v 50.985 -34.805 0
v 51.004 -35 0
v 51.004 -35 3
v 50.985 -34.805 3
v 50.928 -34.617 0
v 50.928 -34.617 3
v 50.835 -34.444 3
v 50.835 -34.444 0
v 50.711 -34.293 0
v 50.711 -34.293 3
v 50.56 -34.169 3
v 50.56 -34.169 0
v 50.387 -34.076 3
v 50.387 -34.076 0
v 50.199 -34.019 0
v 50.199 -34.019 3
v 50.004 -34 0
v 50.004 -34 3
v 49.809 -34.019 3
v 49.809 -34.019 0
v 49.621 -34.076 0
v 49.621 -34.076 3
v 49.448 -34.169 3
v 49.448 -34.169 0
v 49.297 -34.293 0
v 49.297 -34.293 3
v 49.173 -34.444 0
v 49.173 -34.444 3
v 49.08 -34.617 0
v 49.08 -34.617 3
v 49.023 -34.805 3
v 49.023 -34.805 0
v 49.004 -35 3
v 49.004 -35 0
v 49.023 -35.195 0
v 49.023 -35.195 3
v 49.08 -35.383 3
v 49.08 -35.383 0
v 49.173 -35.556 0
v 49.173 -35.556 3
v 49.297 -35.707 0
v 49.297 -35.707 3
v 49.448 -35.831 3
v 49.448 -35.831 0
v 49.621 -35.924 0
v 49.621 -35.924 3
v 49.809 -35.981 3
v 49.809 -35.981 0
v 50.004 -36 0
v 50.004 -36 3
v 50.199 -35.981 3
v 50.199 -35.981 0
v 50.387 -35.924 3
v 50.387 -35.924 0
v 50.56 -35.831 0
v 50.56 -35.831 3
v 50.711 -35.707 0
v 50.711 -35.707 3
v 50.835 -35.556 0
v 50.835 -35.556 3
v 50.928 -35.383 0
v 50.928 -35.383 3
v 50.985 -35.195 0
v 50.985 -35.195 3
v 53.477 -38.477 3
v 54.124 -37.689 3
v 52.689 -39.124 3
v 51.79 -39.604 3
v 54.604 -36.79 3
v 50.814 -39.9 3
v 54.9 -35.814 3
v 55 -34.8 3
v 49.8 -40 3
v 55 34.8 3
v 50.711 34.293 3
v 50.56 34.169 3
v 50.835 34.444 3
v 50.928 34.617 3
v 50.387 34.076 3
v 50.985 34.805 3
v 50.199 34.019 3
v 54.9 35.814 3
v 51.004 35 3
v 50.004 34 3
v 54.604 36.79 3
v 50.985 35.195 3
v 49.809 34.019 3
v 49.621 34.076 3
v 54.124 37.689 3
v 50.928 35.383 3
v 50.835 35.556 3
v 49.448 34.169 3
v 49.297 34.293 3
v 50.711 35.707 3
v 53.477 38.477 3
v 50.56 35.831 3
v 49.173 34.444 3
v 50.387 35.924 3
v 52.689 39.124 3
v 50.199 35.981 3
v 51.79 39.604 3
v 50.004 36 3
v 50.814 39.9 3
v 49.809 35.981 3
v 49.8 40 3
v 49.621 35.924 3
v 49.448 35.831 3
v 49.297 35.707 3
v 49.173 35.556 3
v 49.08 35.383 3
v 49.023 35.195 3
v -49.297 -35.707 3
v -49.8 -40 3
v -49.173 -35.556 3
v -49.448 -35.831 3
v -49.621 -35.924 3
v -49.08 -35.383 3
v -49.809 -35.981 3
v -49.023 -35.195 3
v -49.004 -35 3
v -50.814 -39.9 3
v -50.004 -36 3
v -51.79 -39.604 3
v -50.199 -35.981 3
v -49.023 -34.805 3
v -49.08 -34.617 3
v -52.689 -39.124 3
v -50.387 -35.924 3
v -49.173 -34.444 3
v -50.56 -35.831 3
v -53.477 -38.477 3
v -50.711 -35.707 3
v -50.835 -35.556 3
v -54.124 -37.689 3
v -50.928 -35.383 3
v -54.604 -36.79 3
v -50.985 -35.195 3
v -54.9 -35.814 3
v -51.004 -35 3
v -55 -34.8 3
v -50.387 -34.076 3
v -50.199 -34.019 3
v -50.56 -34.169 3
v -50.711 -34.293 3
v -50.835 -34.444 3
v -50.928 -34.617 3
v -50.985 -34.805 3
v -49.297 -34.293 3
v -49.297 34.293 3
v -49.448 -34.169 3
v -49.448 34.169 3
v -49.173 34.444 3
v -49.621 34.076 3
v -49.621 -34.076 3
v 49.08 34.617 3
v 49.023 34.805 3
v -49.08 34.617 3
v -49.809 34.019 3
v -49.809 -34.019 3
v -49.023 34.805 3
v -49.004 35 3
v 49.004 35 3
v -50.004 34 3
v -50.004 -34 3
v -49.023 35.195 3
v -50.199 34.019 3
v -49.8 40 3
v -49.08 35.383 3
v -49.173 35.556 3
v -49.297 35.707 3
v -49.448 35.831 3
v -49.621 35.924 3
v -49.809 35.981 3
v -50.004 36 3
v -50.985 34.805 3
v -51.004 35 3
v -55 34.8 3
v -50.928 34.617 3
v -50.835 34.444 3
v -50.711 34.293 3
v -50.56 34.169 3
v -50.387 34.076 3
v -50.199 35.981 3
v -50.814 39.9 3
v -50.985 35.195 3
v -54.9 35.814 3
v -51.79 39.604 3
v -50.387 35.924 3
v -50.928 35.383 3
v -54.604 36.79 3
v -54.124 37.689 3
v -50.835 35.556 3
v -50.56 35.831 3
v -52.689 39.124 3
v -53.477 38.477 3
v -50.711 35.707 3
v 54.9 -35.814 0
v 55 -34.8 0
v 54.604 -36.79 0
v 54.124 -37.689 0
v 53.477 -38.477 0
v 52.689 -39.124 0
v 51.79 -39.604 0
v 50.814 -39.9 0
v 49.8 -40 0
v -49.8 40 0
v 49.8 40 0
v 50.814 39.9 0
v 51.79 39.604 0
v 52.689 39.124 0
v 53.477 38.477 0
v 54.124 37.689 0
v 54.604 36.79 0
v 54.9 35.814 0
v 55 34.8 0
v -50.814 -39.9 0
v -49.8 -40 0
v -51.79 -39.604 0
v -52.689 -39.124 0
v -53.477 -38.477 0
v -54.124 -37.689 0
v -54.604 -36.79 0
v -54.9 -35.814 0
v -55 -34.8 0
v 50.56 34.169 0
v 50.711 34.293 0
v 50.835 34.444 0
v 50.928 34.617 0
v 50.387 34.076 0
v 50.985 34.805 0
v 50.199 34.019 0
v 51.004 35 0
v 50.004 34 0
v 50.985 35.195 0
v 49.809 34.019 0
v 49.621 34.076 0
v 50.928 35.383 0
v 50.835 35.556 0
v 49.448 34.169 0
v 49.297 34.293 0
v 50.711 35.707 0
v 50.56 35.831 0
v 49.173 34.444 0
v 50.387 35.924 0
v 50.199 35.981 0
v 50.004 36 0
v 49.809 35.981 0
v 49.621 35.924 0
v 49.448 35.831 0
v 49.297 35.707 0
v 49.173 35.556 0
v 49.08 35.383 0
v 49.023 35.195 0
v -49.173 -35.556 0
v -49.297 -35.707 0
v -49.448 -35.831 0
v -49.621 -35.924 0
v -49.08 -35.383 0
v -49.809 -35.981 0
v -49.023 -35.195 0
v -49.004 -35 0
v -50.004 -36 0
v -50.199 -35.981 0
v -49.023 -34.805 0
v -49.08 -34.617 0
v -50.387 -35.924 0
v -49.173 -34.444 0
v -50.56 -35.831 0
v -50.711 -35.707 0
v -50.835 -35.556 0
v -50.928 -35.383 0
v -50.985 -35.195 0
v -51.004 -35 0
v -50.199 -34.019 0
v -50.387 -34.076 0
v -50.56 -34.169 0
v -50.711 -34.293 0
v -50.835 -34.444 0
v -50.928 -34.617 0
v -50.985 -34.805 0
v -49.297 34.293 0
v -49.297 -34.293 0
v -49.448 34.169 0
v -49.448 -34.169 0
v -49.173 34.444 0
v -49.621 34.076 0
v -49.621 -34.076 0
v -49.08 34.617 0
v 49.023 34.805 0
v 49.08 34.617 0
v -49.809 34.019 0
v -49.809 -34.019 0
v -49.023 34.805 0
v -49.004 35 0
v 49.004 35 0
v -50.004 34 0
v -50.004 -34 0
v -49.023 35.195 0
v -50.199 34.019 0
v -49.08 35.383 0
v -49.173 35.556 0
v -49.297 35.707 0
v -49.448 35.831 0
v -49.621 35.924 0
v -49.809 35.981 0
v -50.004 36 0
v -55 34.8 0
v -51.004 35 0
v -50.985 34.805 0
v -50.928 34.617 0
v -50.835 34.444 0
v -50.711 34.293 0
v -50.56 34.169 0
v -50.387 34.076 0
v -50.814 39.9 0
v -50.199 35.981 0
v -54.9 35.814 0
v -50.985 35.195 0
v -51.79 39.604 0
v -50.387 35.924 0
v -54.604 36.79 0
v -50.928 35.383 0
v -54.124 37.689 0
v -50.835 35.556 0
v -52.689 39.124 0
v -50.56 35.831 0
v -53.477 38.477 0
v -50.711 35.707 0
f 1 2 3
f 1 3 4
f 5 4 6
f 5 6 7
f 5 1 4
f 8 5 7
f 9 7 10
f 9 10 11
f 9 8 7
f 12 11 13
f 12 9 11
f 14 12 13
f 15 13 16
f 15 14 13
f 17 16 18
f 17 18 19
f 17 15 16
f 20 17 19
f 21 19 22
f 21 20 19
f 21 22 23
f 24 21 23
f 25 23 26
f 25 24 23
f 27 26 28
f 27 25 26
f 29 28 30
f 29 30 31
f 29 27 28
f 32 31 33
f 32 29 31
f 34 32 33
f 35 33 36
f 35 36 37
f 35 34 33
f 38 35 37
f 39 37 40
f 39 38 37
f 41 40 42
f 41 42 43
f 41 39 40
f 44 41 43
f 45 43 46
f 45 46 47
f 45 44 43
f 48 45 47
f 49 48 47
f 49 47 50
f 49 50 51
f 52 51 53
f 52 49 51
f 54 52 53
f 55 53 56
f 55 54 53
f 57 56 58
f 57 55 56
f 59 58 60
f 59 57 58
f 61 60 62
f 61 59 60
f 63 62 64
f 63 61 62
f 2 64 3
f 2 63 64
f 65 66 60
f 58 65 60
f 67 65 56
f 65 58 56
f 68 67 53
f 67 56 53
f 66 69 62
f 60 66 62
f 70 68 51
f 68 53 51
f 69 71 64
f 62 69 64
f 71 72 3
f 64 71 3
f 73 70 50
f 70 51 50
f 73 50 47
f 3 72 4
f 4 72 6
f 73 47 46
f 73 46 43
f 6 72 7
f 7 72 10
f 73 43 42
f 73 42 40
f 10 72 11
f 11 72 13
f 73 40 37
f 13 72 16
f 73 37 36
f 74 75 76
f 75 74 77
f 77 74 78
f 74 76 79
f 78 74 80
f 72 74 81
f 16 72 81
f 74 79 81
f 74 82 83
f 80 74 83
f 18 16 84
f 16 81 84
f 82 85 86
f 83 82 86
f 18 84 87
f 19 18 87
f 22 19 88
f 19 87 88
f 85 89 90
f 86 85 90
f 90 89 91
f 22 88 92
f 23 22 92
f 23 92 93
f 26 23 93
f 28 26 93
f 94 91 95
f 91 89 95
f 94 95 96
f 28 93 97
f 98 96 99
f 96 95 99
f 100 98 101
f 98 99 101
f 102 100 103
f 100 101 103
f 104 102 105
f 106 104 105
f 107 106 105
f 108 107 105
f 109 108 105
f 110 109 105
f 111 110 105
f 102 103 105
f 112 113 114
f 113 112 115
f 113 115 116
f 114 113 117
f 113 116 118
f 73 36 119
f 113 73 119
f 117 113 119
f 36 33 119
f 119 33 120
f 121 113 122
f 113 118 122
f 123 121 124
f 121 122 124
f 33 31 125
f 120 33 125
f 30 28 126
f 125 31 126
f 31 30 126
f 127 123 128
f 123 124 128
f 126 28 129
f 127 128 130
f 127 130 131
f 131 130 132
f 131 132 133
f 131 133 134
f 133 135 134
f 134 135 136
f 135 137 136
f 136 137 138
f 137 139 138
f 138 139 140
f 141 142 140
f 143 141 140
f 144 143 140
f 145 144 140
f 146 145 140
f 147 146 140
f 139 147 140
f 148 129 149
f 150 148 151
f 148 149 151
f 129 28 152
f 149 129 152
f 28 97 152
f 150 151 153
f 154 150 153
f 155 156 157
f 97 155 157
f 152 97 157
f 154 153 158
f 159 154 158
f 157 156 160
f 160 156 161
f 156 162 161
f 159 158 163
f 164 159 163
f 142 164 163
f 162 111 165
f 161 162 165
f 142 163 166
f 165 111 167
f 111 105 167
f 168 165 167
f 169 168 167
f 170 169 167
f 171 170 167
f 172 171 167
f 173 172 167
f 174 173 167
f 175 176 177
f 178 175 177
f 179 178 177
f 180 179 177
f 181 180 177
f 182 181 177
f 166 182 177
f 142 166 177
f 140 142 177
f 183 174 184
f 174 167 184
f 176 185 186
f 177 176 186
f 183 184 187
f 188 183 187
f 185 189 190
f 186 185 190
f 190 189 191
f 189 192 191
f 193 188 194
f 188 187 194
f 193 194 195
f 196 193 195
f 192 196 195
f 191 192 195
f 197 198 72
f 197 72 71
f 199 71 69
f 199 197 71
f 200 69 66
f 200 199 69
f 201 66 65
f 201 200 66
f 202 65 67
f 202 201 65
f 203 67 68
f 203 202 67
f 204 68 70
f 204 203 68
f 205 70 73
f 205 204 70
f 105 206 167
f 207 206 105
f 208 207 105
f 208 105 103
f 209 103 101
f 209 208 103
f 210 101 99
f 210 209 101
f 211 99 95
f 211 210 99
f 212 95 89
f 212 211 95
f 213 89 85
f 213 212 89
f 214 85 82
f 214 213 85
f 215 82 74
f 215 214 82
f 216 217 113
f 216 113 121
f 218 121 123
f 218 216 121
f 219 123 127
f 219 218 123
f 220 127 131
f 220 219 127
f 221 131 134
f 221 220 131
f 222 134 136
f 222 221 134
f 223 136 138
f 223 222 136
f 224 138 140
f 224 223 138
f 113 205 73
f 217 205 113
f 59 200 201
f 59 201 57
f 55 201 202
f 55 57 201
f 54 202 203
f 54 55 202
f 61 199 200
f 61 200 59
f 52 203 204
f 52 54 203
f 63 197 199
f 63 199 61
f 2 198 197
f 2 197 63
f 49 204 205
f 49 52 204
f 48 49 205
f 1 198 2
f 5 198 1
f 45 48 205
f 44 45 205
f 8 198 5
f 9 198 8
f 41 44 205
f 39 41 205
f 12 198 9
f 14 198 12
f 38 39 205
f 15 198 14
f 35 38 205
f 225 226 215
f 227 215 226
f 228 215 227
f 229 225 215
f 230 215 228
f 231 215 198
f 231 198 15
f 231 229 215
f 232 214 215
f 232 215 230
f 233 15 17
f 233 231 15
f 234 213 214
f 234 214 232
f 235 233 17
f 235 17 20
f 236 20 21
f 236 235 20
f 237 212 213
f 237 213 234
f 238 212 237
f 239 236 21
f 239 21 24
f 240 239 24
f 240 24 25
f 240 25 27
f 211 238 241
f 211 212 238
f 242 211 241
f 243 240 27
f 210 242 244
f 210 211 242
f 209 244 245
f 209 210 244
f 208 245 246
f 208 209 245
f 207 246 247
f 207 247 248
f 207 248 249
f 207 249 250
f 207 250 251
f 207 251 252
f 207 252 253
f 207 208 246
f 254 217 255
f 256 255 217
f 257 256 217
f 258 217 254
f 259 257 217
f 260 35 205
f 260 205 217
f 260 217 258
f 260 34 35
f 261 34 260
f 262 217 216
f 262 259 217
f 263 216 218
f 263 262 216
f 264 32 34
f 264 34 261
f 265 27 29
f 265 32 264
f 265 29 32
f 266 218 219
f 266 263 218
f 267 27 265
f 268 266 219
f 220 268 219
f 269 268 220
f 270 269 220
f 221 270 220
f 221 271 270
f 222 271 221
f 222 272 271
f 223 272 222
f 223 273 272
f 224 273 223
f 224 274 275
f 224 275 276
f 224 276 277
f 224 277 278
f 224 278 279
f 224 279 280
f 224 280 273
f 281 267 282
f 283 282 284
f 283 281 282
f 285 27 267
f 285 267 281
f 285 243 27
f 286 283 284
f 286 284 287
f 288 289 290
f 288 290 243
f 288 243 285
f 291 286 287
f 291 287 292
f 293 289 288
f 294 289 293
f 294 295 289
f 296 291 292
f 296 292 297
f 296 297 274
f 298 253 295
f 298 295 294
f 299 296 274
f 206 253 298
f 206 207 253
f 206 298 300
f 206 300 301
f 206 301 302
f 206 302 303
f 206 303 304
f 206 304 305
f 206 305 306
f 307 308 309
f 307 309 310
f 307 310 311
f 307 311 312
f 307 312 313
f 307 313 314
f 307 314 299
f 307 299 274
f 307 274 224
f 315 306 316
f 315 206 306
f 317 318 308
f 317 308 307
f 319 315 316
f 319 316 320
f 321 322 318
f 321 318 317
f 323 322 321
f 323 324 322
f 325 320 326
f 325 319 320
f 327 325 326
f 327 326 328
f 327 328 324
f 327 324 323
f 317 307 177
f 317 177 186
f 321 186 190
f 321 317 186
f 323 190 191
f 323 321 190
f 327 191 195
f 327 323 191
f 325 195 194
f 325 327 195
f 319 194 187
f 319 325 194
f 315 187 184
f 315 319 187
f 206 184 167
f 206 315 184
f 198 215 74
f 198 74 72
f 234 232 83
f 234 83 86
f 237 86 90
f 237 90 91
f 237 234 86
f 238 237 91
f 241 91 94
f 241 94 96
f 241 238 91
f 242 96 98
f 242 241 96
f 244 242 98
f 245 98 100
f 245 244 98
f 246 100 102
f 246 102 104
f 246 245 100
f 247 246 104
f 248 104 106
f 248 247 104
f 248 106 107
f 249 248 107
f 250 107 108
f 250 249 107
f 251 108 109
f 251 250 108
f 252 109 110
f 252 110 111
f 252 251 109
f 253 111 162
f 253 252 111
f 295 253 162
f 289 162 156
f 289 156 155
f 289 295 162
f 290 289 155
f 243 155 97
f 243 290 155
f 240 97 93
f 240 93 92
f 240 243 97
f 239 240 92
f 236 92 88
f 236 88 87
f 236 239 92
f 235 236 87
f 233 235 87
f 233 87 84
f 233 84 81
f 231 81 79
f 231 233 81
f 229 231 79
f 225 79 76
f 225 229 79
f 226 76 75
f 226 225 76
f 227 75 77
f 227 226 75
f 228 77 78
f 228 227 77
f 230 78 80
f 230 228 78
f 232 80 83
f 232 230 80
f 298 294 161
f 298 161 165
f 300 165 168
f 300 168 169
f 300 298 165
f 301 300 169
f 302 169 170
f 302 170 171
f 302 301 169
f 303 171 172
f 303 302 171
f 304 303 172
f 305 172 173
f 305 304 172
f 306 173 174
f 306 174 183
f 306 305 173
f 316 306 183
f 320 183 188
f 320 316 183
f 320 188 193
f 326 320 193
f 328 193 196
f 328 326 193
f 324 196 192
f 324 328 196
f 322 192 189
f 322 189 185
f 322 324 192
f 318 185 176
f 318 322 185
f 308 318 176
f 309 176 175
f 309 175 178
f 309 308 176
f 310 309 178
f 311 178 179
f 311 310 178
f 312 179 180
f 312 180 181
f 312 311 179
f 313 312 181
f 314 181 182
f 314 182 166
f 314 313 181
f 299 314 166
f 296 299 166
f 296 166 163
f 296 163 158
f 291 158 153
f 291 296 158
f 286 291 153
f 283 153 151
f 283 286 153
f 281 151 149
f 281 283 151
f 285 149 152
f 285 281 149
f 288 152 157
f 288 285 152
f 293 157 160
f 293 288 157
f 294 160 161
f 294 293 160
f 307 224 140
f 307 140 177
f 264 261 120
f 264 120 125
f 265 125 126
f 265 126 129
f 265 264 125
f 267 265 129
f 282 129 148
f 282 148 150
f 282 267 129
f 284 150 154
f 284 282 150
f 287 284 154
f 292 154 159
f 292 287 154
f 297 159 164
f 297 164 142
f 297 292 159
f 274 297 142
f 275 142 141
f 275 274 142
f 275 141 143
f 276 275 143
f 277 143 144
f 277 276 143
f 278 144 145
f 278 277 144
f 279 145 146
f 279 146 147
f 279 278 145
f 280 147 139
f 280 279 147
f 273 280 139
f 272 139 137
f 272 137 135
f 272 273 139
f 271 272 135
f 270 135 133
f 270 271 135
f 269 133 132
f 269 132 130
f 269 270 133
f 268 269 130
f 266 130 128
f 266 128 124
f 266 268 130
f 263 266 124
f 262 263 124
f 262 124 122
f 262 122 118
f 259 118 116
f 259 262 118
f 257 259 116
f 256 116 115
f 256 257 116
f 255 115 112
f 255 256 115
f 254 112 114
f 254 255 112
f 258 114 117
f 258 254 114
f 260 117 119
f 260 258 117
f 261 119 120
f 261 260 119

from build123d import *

# Parameters (mm, degrees)
BOSS_EXTRU_1_DEPTH = 3
PER_AGE1_OUTLINE_R = 1
PER_AGE1_DEPTH     = 3


# Read off the part's stored shape, not the designer's step: Perçage1
with BuildPart() as part:
    # Esquisse2 → Boss.-Extru.1 (new body)
    with BuildSketch(Plane.XY):
        with BuildLine():
            Line((-49.8, 40), (49.8, 40))
            ThreePointArc((49.8, 40), (53.476955262, 38.476955262), (55, 34.8))
            Line((55, 34.8), (55, -34.8))
            ThreePointArc((55, -34.8), (53.476955262, -38.476955262), (49.8, -40))
            Line((49.8, -40), (-49.8, -40))
            ThreePointArc((-49.8, -40), (-53.476955262, -38.476955262), (-55, -34.8))
            Line((-55, -34.8), (-55, 34.8))
            ThreePointArc((-55, 34.8), (-53.476955262, 38.476955262), (-49.8, 40))
        make_face()
    extrude(amount=BOSS_EXTRU_1_DEPTH)

    # Perçage1 outline → Perçage1 (cut)
    with BuildSketch(Plane.XY):
        with Locations((-50.004001665, 35.000001601)):
            Circle(PER_AGE1_OUTLINE_R)
        with Locations((-50.004001665, -35.000001601)):
            Circle(PER_AGE1_OUTLINE_R)
        with Locations((50.004001665, -35.000001601)):
            Circle(PER_AGE1_OUTLINE_R)
        with Locations((50.004001665, 35.000001601)):
            Circle(PER_AGE1_OUTLINE_R)
    extrude(amount=PER_AGE1_DEPTH, mode=Mode.SUBTRACT)


solid = part.part
